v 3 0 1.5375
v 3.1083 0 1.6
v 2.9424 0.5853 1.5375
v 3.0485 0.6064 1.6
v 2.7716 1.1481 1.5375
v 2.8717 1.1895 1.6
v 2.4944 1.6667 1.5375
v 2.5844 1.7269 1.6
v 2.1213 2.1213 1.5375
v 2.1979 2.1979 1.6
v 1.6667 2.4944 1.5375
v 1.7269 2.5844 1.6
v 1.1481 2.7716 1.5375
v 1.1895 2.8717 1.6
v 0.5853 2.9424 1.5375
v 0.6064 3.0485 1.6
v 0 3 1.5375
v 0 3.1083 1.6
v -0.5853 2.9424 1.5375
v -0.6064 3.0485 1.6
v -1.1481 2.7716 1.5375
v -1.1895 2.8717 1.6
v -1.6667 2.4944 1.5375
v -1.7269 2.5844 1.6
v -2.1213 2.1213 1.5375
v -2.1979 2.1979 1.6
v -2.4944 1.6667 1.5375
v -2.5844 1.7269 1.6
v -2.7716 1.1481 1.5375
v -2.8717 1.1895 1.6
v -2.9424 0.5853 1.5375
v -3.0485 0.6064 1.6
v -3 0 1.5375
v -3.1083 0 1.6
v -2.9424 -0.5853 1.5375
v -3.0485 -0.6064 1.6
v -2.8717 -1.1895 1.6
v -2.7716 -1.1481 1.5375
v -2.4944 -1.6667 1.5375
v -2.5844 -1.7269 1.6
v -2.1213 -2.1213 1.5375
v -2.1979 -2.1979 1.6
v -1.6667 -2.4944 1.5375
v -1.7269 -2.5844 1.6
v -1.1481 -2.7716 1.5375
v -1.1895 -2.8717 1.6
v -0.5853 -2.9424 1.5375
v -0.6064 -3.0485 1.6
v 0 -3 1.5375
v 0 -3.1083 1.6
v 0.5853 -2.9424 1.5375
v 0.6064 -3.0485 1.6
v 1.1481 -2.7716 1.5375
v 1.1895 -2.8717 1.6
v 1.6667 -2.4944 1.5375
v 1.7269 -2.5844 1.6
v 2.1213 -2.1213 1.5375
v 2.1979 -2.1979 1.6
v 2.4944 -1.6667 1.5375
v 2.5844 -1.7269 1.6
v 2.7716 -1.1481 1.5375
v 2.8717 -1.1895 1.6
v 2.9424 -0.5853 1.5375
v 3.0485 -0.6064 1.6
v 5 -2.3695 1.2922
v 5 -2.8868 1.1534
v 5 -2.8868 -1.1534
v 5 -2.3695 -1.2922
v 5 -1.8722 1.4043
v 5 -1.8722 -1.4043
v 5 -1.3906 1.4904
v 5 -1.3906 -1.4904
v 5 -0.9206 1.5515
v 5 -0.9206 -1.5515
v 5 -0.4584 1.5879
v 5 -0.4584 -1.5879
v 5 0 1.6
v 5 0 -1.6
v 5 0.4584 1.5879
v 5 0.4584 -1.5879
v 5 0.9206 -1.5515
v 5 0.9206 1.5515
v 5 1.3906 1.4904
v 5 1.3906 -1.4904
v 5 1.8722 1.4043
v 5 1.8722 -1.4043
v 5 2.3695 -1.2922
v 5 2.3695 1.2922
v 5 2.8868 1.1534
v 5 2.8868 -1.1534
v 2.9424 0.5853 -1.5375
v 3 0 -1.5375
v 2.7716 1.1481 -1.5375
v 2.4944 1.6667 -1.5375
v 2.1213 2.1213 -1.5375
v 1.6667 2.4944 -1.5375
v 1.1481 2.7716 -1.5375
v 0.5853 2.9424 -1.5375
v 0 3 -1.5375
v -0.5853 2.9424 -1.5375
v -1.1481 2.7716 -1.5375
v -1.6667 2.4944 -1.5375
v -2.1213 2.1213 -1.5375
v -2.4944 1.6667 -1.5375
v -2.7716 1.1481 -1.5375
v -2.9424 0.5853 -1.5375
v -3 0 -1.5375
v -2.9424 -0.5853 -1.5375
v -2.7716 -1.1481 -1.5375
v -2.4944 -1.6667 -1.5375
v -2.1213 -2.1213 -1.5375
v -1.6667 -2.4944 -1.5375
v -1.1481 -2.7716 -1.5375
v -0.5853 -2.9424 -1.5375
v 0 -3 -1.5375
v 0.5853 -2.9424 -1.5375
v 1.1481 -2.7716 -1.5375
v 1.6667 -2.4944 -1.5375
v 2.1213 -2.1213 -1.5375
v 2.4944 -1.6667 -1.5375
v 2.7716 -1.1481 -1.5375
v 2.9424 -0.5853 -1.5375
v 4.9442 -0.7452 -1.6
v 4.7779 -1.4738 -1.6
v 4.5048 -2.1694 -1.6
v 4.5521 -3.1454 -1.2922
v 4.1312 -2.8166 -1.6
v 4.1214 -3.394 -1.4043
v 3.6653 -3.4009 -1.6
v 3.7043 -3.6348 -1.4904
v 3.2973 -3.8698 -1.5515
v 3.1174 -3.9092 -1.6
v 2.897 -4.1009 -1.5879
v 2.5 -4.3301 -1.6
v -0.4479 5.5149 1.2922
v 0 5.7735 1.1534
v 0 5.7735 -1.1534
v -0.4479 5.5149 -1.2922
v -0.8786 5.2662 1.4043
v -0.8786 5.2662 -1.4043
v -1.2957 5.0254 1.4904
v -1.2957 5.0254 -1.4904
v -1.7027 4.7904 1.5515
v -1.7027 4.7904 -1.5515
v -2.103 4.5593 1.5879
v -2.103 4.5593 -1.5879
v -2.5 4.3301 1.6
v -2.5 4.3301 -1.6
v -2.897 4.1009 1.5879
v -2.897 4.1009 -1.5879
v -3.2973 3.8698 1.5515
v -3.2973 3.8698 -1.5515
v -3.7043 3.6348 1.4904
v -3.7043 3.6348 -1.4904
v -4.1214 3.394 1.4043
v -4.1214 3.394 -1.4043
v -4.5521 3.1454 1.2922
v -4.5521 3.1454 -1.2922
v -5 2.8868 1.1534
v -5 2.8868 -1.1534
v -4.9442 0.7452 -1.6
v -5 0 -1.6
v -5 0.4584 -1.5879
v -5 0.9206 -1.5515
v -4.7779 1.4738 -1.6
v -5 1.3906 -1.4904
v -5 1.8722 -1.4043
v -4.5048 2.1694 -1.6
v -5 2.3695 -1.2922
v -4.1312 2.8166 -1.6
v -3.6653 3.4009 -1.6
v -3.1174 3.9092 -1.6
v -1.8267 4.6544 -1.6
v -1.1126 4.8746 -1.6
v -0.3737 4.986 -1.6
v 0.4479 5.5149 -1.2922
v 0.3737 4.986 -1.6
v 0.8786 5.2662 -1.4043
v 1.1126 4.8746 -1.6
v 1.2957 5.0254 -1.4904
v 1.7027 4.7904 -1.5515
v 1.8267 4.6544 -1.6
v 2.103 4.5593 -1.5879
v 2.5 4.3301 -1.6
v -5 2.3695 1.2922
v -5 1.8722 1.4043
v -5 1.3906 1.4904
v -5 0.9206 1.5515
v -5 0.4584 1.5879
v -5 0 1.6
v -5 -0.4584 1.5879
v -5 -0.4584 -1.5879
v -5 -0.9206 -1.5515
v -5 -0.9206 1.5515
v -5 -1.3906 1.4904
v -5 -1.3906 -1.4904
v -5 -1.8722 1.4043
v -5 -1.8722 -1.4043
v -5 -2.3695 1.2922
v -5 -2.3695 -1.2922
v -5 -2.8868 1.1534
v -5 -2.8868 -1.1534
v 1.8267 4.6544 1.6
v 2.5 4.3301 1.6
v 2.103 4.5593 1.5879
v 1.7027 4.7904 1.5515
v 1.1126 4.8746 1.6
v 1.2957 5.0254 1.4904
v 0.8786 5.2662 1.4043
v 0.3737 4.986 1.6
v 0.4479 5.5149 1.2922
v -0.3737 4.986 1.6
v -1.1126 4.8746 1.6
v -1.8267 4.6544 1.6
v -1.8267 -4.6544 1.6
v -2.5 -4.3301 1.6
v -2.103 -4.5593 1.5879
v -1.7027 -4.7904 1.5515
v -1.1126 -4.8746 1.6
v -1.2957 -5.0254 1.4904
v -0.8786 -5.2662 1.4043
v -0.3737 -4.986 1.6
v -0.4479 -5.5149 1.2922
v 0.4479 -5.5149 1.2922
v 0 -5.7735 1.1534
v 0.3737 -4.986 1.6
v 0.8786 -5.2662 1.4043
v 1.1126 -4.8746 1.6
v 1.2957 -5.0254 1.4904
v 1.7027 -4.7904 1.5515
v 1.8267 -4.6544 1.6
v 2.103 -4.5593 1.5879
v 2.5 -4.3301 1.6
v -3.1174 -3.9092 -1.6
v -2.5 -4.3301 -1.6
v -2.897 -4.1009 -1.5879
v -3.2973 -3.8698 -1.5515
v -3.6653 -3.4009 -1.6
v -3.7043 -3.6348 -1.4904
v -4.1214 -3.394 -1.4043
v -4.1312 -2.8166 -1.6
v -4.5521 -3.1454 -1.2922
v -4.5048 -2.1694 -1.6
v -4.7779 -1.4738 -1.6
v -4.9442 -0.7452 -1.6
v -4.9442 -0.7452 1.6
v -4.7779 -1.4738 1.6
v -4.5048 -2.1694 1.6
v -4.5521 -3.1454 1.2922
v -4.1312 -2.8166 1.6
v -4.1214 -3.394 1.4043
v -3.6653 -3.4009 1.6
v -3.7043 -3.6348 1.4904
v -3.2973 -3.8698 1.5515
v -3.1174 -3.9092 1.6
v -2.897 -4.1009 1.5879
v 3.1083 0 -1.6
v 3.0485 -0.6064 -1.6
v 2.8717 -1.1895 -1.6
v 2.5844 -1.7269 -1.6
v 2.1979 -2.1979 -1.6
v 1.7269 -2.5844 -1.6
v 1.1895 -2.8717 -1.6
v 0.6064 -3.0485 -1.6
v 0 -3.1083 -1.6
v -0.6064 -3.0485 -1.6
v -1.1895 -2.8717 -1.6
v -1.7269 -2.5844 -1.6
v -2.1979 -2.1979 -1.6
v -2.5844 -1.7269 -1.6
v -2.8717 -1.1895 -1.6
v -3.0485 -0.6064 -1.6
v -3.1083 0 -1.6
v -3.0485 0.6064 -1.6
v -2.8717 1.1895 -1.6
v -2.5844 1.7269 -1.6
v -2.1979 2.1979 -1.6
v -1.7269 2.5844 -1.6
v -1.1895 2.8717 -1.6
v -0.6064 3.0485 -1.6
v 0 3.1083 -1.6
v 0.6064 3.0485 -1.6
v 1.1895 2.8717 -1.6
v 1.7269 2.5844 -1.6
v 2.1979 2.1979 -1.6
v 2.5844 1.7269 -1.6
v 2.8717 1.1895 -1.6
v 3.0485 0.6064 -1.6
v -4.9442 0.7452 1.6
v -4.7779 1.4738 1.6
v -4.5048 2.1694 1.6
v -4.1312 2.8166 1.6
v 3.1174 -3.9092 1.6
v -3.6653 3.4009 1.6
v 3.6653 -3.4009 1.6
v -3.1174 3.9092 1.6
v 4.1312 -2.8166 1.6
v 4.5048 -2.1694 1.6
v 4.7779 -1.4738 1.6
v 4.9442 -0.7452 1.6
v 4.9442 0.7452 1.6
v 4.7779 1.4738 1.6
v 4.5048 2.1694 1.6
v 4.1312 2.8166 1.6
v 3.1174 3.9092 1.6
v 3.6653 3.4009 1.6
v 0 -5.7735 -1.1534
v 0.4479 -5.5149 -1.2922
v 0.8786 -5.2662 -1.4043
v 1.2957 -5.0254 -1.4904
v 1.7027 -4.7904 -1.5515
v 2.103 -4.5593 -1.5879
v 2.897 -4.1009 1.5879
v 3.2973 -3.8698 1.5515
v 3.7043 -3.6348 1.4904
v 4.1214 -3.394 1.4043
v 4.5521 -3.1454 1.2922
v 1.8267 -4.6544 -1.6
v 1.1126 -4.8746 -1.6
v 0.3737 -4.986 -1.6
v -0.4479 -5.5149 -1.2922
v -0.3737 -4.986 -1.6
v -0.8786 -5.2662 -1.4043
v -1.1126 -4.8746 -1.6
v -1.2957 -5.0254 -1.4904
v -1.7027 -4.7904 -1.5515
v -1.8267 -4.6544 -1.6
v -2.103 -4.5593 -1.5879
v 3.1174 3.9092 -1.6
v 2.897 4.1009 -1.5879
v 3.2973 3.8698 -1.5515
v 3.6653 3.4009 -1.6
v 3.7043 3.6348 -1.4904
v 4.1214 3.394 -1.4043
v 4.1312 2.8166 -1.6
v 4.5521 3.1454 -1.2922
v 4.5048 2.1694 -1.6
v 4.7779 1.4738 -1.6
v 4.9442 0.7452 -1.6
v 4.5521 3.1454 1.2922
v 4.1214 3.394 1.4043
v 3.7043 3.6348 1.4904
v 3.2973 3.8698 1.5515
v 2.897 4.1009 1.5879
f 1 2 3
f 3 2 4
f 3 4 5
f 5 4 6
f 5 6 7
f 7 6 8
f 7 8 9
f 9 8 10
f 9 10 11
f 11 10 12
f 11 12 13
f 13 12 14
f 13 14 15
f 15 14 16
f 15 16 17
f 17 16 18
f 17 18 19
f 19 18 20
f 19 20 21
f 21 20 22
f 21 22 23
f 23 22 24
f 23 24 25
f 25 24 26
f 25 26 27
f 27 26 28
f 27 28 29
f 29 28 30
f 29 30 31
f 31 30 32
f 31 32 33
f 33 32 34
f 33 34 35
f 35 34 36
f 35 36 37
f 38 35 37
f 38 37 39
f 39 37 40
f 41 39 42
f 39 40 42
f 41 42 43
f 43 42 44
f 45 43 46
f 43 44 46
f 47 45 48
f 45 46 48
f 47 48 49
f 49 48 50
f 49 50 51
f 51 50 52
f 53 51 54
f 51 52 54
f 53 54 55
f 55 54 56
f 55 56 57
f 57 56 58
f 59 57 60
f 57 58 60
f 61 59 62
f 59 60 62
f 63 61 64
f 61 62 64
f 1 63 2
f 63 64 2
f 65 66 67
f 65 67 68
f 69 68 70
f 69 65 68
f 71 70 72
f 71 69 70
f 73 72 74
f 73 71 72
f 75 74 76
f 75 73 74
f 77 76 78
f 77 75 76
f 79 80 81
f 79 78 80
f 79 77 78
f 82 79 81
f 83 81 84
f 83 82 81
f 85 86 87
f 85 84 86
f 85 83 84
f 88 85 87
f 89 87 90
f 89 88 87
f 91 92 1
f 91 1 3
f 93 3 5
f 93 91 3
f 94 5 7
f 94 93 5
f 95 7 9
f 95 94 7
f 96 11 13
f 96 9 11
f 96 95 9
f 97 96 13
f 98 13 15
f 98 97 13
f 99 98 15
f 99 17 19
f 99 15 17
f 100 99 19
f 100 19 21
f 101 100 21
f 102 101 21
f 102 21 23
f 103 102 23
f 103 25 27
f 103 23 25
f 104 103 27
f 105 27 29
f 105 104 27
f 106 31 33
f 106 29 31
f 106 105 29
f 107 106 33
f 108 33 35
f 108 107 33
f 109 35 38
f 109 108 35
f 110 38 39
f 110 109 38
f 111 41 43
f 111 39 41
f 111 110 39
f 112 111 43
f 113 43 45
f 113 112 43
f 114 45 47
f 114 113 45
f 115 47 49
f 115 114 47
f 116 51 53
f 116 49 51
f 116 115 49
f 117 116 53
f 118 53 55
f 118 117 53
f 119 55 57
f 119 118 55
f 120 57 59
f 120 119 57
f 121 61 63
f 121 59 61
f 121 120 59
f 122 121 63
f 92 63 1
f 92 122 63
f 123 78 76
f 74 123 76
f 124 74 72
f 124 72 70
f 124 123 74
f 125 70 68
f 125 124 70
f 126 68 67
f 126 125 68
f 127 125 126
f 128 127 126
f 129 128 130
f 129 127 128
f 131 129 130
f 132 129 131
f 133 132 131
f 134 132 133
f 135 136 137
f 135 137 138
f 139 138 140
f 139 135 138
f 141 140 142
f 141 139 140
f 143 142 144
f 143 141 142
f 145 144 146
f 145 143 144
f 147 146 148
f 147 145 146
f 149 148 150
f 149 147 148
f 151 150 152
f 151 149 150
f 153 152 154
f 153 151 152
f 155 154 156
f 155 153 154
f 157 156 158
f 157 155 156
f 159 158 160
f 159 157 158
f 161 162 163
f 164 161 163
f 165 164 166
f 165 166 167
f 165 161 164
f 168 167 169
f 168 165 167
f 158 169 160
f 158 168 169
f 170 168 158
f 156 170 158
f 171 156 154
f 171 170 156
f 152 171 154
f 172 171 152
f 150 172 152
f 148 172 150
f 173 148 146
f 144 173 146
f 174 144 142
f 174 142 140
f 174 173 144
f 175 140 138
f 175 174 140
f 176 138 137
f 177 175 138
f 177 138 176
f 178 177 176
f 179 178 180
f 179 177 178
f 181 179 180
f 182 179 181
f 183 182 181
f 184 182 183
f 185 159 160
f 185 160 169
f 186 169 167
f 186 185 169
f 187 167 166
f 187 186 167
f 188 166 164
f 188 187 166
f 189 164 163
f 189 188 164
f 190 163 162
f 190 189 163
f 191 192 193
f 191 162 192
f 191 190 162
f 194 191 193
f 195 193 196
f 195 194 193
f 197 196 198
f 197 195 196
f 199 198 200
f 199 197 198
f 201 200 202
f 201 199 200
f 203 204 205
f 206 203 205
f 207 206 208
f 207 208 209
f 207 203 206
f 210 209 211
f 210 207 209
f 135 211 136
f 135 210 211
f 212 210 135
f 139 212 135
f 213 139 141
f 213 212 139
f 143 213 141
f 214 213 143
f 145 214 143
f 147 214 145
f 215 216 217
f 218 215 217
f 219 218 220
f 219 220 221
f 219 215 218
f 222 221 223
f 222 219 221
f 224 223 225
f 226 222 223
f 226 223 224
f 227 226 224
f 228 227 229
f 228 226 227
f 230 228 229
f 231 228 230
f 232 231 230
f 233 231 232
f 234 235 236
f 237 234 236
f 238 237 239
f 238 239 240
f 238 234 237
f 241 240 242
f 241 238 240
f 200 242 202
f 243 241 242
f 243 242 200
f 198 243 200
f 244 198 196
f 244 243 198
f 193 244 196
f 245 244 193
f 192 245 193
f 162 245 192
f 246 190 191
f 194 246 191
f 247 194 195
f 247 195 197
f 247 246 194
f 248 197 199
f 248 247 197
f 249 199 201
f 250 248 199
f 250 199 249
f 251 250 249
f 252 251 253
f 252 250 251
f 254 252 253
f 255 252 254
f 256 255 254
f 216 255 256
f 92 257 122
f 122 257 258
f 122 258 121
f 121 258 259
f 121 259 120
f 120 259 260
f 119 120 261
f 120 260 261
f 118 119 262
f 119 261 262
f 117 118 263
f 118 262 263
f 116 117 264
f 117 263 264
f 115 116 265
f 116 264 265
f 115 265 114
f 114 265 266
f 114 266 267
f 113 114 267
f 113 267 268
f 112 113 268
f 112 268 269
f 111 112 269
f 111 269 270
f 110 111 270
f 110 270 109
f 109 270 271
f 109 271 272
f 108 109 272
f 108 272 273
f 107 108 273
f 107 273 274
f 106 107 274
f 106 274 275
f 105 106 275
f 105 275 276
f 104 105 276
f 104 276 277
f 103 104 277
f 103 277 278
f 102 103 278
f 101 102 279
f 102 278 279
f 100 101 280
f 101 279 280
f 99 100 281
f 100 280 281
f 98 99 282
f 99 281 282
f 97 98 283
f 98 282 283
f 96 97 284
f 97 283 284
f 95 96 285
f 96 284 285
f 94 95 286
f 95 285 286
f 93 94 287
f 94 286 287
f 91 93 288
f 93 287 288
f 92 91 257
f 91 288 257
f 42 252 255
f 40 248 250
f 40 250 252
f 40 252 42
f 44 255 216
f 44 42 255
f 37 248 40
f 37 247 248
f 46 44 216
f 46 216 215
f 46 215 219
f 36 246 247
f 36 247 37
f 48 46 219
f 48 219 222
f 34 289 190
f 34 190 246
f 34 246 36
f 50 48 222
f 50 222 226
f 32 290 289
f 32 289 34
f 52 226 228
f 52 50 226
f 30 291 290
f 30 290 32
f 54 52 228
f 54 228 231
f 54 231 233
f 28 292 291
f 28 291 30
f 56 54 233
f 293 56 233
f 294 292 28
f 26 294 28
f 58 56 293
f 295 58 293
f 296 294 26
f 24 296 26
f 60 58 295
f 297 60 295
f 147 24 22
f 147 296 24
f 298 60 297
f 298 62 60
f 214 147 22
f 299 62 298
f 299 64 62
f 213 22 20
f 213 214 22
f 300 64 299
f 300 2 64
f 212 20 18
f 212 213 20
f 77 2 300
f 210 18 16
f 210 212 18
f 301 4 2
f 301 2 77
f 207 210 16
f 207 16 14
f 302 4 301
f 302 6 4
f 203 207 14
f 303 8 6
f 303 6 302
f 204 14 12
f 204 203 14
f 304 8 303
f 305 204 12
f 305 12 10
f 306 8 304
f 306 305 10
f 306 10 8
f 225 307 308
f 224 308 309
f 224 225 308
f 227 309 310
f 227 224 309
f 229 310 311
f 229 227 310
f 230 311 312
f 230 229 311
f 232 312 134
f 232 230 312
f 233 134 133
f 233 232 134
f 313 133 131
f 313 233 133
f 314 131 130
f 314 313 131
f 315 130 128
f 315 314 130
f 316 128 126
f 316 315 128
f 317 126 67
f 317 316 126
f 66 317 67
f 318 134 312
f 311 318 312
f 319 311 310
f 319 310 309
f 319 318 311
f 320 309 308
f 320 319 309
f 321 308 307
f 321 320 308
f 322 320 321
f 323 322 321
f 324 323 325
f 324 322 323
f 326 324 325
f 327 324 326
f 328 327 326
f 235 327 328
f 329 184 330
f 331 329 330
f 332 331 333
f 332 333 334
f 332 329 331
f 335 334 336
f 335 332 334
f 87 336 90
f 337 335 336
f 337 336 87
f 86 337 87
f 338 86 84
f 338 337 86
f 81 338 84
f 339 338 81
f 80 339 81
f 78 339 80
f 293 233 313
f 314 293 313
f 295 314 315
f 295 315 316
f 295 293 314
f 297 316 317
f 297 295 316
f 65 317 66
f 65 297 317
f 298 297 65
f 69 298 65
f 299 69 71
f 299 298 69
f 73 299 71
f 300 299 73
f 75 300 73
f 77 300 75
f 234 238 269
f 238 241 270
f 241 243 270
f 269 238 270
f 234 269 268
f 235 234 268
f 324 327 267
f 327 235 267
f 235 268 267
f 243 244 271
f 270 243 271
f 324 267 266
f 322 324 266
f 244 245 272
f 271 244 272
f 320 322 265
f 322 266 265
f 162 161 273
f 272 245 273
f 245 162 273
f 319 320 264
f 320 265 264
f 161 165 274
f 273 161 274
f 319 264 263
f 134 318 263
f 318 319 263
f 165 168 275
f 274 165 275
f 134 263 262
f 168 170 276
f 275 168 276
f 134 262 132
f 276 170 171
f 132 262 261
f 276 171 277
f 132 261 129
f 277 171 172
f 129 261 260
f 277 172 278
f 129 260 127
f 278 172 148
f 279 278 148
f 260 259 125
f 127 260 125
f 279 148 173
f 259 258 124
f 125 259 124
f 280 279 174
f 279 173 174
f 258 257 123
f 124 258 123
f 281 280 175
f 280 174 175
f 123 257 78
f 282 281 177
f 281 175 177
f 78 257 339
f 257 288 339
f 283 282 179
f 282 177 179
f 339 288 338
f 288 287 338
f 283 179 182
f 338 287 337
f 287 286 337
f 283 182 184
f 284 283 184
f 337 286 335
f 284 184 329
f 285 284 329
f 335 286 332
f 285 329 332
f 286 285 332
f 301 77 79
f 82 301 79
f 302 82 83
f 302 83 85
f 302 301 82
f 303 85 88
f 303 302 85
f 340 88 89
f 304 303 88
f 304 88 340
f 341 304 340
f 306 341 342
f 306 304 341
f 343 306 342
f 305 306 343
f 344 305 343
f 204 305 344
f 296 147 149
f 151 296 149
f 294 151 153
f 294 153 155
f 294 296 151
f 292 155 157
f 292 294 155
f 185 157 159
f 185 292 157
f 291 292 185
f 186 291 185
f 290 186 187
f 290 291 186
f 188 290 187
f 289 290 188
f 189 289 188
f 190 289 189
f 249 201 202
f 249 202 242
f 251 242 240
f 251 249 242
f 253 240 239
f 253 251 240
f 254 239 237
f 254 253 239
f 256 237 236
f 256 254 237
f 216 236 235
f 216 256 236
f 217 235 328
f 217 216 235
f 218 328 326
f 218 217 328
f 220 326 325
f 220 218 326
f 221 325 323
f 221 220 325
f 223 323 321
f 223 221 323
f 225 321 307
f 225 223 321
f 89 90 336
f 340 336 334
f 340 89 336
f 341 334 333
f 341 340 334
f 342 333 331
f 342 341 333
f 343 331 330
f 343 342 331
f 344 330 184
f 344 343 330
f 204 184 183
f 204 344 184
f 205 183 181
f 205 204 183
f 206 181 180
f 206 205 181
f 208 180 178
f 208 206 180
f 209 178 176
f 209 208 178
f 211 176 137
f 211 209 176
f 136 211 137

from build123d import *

# Parameters (mm, degrees)
SKETCH3_R                    = 3
BOSS_EXTRUDE1_DEPTH          = 1.6
SKETCH4_OUTSIDE_W            = 49.762
SKETCH4_OUTSIDE_H            = 51.31
SKETCH4_OUTSIDE_R            = 5
CUT_EXTRUDE1_DEPTH           = 10
CUT_EXTRUDE1_DRAFT           = -60
SKETCH4_OUTSIDE_R_2          = 3.108253175
CUT_EXTRUDE1_PROFILE_2_DEPTH = 10
CUT_EXTRUDE1_PROFILE_2_DRAFT = -60
MIRROR1_COPY_1_SKETCH_W      = 49.762
MIRROR1_COPY_1_SKETCH_H      = 51.31
MIRROR1_COPY_1_SKETCH_R      = 5
MIRROR1_COPY_1_DEPTH         = 10
MIRROR1_COPY_1_DRAFT         = -60
MIRROR1_COPY_2_SKETCH_R      = 3.108253175
MIRROR1_COPY_2_DEPTH         = 10
MIRROR1_COPY_2_DRAFT         = -60
MIRROR1_COPY_3_SKETCH_R      = 3.108253175
MIRROR1_COPY_3_DEPTH         = 10
MIRROR1_COPY_3_DRAFT         = -60


with BuildPart() as part:
    # Sketch3 → Boss-Extrude1 (new, symmetric)
    with BuildSketch(Plane.XY):
        Polygon((-5, 2.886751346), (-5, -2.886751346), (0, -5.773502692), (5, -2.886751346), (5, 2.886751346), (0, 5.773502692), align=None)
        Circle(SKETCH3_R, mode=Mode.SUBTRACT)
    extrude(amount=BOSS_EXTRUDE1_DEPTH, both=True)


with BuildPart() as cut_extrude1_tool:
    # Sketch4 outside → Cut-Extrude1 (with draft: the straight prism first)
    with BuildSketch(Plane.XY.offset(1.6)):
        Rectangle(SKETCH4_OUTSIDE_W, SKETCH4_OUTSIDE_H)
        Circle(SKETCH4_OUTSIDE_R, mode=Mode.SUBTRACT)
    extrude(amount=-CUT_EXTRUDE1_DEPTH)
    # Cut-Extrude1: the draft: its side faces are tilted about the plane it starts from
    cut_extrude1_sides = [cut_extrude1_tool.faces().sort_by_distance(p)[0] for p in [
        (0, -25.655, -3.4),
        (24.881, 0, -3.4),
        (0, 25.655, -3.4),
        (-24.881, 0, -3.4),
        (-5, 0, -3.4),
    ]]
    draft(cut_extrude1_sides, Plane.XY.offset(1.6), CUT_EXTRUDE1_DRAFT)


with BuildPart() as part_1:
    add(part.part)

    # Cut-Extrude1: cut by cut_extrude1_tool
    add(cut_extrude1_tool.part, mode=Mode.SUBTRACT)


with BuildPart() as cut_extrude1_profile_2_tool:
    # Sketch4 outside → Cut-Extrude1 profile 2 (with draft: the straight prism first)
    with BuildSketch(Plane.XY.offset(1.6)):
        Circle(SKETCH4_OUTSIDE_R_2)
    extrude(amount=-CUT_EXTRUDE1_PROFILE_2_DEPTH)
    # Cut-Extrude1 profile 2: the draft: its side faces are tilted about the plane it starts from
    cut_extrude1_profile_2_sides = [cut_extrude1_profile_2_tool.faces().sort_by_distance(p)[0] for p in [
        (-3.108253175, 0, -3.4),
    ]]
    draft(cut_extrude1_profile_2_sides, Plane.XY.offset(1.6), CUT_EXTRUDE1_PROFILE_2_DRAFT)


with BuildPart() as part_2:
    add(part_1.part)

    # Cut-Extrude1 profile 2: cut by cut_extrude1_profile_2_tool
    add(cut_extrude1_profile_2_tool.part, mode=Mode.SUBTRACT)


with BuildPart() as mirror1_copy_1_tool:
    # Mirror1 copy 1 sketch → Mirror1 copy 1 (with draft: the straight prism first)
    with BuildSketch(Plane(origin=(0, 0, -1.6), x_dir=(1, 0, 0), z_dir=(0, 0, -1))):
        Rectangle(MIRROR1_COPY_1_SKETCH_W, MIRROR1_COPY_1_SKETCH_H)
        Circle(MIRROR1_COPY_1_SKETCH_R, mode=Mode.SUBTRACT)
    extrude(amount=-MIRROR1_COPY_1_DEPTH)
    # Mirror1 copy 1: the draft: its side faces are tilted about the plane it starts from
    mirror1_copy_1_sides = [mirror1_copy_1_tool.faces().sort_by_distance(p)[0] for p in [
        (0, -25.655, 3.4),
        (24.881, 0, 3.4),
        (0, 25.655, 3.4),
        (-24.881, 0, 3.4),
        (-5, 0, 3.4),
    ]]
    draft(mirror1_copy_1_sides, Plane(origin=(0, 0, -1.6), x_dir=(1, 0, 0), z_dir=(0, 0, -1)), MIRROR1_COPY_1_DRAFT)


with BuildPart() as part_3:
    add(part_2.part)

    # Mirror1 copy 1: cut by mirror1_copy_1_tool
    add(mirror1_copy_1_tool.part, mode=Mode.SUBTRACT)


with BuildPart() as mirror1_copy_2_tool:
    # Mirror1 copy 2 sketch → Mirror1 copy 2 (with draft: the straight prism first)
    with BuildSketch(Plane(origin=(0, 0, -1.6), x_dir=(1, 0, 0), z_dir=(0, 0, -1))):
        Circle(MIRROR1_COPY_2_SKETCH_R)
    extrude(amount=-MIRROR1_COPY_2_DEPTH)
    # Mirror1 copy 2: the draft: its side faces are tilted about the plane it starts from
    mirror1_copy_2_sides = [mirror1_copy_2_tool.faces().sort_by_distance(p)[0] for p in [
        (-3.108253175, 0, 3.4),
    ]]
    draft(mirror1_copy_2_sides, Plane(origin=(0, 0, -1.6), x_dir=(1, 0, 0), z_dir=(0, 0, -1)), MIRROR1_COPY_2_DRAFT)


with BuildPart() as part_4:
    add(part_3.part)

    # Mirror1 copy 2: cut by mirror1_copy_2_tool
    add(mirror1_copy_2_tool.part, mode=Mode.SUBTRACT)


with BuildPart() as mirror1_copy_3_tool:
    # Mirror1 copy 3 sketch → Mirror1 copy 3 (with draft: the straight prism first)
    with BuildSketch(Plane(origin=(0, 0, -1.6), x_dir=(1, 0, 0), z_dir=(0, 0, -1))):
        Circle(MIRROR1_COPY_3_SKETCH_R)
    extrude(amount=-MIRROR1_COPY_3_DEPTH)
    # Mirror1 copy 3: the draft: its side faces are tilted about the plane it starts from
    mirror1_copy_3_sides = [mirror1_copy_3_tool.faces().sort_by_distance(p)[0] for p in [
        (-3.108253175, 0, 3.4),
    ]]
    draft(mirror1_copy_3_sides, Plane(origin=(0, 0, -1.6), x_dir=(1, 0, 0), z_dir=(0, 0, -1)), MIRROR1_COPY_3_DRAFT)


with BuildPart() as part_5:
    add(part_4.part)

    # Mirror1 copy 3: cut by mirror1_copy_3_tool
    add(mirror1_copy_3_tool.part, mode=Mode.SUBTRACT)


solid = part_5.part
